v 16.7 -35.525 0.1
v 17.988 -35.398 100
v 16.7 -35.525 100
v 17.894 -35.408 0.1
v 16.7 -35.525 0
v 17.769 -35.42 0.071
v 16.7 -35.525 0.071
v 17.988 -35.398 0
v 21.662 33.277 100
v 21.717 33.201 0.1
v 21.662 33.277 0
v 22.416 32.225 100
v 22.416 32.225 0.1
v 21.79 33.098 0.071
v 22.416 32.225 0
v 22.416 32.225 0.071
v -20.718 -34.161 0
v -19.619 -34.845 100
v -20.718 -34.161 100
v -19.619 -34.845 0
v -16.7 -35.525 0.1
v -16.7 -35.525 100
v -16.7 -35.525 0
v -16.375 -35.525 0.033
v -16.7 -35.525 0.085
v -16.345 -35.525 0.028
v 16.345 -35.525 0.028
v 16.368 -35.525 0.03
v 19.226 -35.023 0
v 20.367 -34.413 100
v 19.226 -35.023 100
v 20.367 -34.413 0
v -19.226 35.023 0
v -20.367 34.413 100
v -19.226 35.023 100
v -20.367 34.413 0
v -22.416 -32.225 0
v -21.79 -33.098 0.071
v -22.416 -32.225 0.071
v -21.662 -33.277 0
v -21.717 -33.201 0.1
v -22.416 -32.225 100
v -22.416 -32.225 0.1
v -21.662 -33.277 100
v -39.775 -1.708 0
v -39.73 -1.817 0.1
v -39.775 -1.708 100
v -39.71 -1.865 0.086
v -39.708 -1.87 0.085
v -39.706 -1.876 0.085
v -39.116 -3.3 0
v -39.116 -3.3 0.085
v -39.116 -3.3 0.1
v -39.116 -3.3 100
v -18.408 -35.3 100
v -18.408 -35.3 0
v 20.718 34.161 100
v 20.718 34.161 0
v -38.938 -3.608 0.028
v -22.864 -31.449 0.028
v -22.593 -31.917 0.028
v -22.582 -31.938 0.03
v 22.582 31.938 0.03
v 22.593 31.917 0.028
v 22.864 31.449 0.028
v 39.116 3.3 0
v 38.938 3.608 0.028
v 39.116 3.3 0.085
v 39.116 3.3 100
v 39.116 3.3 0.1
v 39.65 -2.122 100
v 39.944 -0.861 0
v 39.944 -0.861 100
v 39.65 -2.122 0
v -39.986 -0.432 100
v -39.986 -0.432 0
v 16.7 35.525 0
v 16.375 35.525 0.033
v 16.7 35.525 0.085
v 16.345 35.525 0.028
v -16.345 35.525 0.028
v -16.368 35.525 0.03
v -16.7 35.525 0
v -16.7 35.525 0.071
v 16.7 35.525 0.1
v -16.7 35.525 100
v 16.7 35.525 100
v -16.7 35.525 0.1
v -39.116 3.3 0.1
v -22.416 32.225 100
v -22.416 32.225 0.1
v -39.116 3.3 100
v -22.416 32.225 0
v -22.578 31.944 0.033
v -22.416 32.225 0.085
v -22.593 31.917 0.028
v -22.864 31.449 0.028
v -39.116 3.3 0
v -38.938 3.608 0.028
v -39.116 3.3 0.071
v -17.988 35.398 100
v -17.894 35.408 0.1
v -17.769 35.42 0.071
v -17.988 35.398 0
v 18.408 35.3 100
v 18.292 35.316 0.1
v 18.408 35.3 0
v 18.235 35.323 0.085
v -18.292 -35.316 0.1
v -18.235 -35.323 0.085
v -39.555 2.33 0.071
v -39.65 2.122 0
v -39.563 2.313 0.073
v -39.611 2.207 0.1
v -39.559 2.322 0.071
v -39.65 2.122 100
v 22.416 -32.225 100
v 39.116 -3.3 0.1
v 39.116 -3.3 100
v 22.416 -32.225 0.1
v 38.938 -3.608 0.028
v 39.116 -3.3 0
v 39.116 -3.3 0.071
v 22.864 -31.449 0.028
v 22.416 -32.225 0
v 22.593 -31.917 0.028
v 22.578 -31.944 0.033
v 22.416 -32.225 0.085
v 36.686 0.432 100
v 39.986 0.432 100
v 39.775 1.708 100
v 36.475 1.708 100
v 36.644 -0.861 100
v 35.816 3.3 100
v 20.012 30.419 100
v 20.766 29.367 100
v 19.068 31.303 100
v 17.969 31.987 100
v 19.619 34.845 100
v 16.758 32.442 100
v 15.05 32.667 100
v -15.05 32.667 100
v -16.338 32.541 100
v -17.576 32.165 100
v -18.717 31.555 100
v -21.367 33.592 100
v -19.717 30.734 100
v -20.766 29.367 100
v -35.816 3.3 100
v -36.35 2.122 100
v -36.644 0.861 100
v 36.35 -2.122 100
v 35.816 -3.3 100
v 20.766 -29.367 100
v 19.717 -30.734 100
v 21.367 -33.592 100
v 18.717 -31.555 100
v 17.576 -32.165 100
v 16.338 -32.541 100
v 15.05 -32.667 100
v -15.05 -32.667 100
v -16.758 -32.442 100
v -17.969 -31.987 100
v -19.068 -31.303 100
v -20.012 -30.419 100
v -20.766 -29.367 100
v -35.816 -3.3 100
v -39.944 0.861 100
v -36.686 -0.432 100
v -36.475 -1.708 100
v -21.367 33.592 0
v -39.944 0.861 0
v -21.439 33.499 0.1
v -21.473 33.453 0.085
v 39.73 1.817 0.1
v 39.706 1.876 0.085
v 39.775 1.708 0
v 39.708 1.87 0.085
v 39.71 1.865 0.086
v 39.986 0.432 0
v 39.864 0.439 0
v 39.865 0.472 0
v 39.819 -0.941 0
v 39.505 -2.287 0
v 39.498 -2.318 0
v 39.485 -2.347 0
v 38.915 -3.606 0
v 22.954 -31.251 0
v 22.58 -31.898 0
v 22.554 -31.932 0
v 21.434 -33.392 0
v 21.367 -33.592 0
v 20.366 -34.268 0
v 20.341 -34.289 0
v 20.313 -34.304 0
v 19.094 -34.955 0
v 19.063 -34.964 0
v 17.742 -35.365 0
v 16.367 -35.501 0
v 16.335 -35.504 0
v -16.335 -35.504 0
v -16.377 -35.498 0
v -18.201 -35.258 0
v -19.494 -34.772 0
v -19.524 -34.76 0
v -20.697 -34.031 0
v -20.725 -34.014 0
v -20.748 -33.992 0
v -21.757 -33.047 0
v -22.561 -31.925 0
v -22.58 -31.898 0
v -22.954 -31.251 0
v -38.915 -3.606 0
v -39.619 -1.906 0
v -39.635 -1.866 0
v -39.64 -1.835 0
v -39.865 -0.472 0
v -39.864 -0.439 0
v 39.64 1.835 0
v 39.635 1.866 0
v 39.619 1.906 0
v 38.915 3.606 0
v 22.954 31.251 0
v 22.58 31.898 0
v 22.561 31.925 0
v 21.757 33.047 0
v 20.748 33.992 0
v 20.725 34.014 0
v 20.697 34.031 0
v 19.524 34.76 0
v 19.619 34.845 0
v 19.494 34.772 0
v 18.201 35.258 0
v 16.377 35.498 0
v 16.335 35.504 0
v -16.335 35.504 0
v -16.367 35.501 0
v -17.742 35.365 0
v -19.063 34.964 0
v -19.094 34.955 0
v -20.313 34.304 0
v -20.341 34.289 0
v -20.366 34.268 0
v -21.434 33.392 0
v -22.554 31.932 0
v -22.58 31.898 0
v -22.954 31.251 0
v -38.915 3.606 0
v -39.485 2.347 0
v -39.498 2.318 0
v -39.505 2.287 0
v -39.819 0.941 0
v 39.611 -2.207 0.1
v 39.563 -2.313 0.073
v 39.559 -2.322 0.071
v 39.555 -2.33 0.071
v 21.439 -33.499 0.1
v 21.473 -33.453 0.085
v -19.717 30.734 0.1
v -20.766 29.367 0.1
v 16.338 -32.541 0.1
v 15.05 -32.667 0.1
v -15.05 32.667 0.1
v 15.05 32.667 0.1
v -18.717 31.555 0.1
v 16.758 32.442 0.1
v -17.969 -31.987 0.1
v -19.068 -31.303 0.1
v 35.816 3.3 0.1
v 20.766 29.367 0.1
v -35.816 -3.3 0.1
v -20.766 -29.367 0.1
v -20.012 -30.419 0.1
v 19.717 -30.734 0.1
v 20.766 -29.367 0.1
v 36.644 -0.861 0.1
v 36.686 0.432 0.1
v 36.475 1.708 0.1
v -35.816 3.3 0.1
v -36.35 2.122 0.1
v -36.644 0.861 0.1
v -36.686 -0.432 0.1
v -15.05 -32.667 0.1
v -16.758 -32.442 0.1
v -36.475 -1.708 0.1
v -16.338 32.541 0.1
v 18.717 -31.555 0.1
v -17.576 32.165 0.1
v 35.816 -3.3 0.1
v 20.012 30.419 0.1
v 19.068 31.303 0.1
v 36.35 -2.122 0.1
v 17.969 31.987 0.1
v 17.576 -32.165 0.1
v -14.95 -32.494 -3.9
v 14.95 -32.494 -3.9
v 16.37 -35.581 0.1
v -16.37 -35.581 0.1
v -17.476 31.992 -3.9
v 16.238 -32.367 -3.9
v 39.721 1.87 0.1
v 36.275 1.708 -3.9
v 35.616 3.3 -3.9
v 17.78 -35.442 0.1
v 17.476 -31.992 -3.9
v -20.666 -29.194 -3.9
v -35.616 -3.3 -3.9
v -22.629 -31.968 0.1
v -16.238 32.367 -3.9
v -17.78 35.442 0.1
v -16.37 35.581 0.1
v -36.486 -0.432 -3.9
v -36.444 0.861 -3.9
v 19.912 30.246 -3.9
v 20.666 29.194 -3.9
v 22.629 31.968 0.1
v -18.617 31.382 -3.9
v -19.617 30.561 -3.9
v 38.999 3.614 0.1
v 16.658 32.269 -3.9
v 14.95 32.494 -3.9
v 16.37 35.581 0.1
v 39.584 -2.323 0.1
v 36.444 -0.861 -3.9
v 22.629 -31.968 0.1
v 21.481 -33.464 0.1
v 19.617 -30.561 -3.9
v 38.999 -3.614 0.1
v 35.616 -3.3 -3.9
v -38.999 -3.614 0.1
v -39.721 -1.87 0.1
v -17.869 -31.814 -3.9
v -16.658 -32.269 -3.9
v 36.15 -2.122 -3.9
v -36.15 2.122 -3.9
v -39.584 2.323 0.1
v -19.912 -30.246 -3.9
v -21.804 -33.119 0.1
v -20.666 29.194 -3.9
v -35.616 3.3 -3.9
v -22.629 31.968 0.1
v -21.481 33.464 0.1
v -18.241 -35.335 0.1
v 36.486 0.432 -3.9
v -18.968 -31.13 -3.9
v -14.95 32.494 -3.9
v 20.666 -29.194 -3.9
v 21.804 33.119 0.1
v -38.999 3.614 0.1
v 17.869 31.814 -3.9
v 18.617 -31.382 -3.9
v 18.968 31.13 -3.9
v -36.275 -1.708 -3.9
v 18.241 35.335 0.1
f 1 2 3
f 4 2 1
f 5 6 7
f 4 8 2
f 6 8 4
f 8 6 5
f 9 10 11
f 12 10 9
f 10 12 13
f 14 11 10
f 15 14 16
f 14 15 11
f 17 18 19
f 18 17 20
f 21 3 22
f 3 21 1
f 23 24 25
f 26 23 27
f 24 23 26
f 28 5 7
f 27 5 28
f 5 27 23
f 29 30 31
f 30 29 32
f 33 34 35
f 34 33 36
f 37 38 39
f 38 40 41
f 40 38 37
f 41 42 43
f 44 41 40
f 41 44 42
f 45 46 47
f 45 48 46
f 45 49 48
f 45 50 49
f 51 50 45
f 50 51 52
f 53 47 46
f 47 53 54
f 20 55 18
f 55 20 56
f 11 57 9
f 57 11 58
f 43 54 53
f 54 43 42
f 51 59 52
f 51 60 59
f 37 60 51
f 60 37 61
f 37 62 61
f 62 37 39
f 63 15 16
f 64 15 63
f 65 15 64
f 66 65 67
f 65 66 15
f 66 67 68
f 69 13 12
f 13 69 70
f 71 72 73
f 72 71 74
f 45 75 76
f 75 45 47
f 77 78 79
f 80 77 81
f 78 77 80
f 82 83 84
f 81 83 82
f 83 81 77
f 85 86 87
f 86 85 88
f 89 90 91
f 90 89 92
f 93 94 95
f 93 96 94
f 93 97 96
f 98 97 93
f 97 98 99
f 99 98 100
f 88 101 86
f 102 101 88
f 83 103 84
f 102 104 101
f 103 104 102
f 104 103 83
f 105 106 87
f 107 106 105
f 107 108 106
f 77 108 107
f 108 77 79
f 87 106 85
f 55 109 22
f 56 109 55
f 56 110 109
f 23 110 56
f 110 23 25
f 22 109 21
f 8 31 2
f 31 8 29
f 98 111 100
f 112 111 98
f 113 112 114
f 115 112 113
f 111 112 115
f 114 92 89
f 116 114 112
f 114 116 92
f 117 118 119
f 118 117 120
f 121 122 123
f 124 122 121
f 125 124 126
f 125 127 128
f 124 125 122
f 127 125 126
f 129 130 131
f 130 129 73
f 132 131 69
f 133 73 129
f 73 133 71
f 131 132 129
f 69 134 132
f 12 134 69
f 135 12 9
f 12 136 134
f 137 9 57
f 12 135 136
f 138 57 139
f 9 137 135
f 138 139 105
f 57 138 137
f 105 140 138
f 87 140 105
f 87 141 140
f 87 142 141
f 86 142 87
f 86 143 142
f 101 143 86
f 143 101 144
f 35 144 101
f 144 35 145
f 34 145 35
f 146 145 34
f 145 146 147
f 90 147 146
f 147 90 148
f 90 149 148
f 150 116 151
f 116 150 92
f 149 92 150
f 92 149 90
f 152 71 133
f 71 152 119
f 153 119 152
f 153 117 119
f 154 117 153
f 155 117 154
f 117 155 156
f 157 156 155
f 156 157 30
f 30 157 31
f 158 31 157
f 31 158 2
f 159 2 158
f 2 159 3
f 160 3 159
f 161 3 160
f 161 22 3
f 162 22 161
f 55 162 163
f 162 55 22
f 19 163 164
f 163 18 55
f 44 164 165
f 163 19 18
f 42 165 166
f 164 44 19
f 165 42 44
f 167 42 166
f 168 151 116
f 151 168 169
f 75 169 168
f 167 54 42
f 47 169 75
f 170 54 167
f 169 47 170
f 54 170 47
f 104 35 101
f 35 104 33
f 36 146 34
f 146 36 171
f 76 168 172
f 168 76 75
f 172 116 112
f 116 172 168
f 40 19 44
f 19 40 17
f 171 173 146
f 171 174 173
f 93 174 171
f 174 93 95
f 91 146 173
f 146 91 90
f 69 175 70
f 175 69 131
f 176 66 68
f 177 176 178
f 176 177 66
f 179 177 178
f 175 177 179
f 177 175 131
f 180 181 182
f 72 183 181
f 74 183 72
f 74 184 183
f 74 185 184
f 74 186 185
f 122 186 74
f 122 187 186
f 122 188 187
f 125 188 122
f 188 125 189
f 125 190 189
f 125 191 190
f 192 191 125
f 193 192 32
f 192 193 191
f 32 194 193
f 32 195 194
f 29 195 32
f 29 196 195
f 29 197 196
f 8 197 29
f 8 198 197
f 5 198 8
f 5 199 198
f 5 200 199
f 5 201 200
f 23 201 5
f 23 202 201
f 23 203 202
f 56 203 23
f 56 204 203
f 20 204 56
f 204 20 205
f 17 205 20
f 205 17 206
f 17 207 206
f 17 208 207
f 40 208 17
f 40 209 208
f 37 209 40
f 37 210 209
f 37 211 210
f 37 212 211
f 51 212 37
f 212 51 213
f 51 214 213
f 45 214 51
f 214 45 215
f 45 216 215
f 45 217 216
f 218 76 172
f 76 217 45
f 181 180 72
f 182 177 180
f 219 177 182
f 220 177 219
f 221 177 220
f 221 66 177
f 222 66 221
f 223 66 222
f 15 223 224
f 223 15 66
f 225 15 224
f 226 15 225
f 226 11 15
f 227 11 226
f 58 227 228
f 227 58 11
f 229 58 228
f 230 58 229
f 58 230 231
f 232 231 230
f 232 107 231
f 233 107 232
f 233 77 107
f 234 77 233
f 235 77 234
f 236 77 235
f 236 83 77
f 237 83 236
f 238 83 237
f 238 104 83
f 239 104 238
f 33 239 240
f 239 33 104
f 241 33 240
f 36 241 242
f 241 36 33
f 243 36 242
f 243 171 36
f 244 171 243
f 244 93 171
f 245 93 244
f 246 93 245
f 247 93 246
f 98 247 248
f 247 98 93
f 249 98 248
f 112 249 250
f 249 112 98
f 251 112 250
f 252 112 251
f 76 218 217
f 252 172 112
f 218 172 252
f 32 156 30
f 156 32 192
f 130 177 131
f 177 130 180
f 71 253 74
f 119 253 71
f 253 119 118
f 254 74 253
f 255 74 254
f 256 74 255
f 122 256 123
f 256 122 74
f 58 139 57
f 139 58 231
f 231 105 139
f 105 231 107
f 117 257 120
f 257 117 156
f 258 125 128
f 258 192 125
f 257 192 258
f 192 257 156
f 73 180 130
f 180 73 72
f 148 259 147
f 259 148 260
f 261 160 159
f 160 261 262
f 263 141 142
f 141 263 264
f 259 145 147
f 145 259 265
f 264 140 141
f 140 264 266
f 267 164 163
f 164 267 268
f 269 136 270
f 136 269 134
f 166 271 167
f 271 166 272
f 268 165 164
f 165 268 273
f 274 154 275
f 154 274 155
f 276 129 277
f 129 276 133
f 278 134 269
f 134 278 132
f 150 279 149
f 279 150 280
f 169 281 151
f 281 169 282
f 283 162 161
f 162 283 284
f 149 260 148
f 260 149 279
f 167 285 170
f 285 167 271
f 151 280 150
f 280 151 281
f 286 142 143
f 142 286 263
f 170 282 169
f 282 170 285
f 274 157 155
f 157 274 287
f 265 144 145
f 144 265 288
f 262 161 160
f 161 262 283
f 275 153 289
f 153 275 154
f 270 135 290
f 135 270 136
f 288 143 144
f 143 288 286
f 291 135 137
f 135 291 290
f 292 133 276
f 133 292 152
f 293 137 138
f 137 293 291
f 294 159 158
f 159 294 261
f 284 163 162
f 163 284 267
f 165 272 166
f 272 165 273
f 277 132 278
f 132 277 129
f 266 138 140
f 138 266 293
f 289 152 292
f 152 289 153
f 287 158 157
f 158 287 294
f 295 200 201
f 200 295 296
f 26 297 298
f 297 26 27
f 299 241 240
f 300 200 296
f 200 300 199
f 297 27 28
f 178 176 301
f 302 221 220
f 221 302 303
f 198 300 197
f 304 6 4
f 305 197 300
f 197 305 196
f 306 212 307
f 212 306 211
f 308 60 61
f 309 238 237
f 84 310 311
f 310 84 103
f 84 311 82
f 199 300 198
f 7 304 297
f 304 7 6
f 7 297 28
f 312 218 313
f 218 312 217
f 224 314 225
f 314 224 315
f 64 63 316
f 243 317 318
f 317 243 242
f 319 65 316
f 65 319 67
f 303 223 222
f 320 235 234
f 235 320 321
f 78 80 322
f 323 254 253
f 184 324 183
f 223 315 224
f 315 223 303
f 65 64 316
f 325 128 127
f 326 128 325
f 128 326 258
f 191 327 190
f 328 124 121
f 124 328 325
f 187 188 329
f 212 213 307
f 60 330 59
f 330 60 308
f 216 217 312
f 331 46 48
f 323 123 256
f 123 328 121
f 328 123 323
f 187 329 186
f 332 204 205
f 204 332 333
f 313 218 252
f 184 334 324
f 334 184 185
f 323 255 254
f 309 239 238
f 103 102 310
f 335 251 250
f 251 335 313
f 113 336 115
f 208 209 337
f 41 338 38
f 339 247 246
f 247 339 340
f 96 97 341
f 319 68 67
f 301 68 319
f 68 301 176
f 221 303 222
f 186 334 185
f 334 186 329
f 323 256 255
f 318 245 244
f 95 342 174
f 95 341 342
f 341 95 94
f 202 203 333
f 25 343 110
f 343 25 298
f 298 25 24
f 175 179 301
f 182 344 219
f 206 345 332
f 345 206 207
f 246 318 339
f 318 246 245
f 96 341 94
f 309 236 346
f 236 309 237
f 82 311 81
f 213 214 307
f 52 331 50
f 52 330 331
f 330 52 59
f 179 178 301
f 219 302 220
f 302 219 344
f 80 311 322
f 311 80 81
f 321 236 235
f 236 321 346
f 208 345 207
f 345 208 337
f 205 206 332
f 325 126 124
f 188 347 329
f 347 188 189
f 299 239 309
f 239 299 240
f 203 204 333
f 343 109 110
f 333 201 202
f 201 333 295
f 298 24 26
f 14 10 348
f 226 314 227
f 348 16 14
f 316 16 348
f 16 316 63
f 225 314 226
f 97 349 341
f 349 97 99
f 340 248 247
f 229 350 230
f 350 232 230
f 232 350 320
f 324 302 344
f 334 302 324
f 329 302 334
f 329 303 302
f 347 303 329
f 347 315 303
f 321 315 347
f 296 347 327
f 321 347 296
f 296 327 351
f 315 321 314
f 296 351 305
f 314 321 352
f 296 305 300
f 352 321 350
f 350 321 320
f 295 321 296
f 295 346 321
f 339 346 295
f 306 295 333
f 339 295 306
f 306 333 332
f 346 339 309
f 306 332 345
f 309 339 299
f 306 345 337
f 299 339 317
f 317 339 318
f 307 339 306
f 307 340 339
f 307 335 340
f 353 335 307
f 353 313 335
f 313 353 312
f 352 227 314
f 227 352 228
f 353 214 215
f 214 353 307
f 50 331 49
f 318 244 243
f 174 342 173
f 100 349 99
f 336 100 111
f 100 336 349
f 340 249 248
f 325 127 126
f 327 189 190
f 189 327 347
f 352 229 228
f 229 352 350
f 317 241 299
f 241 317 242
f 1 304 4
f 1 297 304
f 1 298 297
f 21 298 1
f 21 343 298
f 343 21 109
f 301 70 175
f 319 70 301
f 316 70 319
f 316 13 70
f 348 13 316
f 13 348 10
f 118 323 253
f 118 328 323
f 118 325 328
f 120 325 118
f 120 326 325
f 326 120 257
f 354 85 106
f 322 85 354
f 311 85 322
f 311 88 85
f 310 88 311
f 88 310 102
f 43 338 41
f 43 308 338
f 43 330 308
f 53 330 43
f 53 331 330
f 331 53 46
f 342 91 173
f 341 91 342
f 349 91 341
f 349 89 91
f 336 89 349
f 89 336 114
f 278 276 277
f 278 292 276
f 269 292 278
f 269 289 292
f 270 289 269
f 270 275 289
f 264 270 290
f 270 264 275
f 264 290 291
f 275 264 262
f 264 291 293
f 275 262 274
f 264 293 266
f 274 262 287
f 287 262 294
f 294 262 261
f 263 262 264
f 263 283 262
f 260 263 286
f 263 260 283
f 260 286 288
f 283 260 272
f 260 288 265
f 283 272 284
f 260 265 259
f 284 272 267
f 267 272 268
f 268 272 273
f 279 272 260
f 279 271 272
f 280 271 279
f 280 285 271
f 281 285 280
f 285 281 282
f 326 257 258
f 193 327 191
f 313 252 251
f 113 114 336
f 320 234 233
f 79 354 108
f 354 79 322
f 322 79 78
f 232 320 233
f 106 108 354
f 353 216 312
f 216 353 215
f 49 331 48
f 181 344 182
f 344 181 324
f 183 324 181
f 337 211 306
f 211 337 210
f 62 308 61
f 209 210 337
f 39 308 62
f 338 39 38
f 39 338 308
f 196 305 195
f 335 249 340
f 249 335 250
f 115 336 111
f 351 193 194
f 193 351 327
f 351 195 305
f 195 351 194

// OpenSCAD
module bin(height = 20, size = 10, wall = 1.5) {
  difference() {
    linear_extrude(height, $fn = 32)
      offset(wall * 2)
        circle(size - (wall * 2), $fn = 6);
    
    translate([0, 0, - 1])
      linear_extrude(height + 2, $fn = 32)
        offset(wall * 2)
          circle(size - (wall * 2) - wall, $fn = 6);
  }
  
    translate([0, 0, -3.9])
      linear_extrude(4, scale = 1.095, $fn = 32)
        offset(wall * 2)
          circle(size - (wall * 2) - wall - 0.2, $fn = 6);
}

bin(100, 40, 3.3);
